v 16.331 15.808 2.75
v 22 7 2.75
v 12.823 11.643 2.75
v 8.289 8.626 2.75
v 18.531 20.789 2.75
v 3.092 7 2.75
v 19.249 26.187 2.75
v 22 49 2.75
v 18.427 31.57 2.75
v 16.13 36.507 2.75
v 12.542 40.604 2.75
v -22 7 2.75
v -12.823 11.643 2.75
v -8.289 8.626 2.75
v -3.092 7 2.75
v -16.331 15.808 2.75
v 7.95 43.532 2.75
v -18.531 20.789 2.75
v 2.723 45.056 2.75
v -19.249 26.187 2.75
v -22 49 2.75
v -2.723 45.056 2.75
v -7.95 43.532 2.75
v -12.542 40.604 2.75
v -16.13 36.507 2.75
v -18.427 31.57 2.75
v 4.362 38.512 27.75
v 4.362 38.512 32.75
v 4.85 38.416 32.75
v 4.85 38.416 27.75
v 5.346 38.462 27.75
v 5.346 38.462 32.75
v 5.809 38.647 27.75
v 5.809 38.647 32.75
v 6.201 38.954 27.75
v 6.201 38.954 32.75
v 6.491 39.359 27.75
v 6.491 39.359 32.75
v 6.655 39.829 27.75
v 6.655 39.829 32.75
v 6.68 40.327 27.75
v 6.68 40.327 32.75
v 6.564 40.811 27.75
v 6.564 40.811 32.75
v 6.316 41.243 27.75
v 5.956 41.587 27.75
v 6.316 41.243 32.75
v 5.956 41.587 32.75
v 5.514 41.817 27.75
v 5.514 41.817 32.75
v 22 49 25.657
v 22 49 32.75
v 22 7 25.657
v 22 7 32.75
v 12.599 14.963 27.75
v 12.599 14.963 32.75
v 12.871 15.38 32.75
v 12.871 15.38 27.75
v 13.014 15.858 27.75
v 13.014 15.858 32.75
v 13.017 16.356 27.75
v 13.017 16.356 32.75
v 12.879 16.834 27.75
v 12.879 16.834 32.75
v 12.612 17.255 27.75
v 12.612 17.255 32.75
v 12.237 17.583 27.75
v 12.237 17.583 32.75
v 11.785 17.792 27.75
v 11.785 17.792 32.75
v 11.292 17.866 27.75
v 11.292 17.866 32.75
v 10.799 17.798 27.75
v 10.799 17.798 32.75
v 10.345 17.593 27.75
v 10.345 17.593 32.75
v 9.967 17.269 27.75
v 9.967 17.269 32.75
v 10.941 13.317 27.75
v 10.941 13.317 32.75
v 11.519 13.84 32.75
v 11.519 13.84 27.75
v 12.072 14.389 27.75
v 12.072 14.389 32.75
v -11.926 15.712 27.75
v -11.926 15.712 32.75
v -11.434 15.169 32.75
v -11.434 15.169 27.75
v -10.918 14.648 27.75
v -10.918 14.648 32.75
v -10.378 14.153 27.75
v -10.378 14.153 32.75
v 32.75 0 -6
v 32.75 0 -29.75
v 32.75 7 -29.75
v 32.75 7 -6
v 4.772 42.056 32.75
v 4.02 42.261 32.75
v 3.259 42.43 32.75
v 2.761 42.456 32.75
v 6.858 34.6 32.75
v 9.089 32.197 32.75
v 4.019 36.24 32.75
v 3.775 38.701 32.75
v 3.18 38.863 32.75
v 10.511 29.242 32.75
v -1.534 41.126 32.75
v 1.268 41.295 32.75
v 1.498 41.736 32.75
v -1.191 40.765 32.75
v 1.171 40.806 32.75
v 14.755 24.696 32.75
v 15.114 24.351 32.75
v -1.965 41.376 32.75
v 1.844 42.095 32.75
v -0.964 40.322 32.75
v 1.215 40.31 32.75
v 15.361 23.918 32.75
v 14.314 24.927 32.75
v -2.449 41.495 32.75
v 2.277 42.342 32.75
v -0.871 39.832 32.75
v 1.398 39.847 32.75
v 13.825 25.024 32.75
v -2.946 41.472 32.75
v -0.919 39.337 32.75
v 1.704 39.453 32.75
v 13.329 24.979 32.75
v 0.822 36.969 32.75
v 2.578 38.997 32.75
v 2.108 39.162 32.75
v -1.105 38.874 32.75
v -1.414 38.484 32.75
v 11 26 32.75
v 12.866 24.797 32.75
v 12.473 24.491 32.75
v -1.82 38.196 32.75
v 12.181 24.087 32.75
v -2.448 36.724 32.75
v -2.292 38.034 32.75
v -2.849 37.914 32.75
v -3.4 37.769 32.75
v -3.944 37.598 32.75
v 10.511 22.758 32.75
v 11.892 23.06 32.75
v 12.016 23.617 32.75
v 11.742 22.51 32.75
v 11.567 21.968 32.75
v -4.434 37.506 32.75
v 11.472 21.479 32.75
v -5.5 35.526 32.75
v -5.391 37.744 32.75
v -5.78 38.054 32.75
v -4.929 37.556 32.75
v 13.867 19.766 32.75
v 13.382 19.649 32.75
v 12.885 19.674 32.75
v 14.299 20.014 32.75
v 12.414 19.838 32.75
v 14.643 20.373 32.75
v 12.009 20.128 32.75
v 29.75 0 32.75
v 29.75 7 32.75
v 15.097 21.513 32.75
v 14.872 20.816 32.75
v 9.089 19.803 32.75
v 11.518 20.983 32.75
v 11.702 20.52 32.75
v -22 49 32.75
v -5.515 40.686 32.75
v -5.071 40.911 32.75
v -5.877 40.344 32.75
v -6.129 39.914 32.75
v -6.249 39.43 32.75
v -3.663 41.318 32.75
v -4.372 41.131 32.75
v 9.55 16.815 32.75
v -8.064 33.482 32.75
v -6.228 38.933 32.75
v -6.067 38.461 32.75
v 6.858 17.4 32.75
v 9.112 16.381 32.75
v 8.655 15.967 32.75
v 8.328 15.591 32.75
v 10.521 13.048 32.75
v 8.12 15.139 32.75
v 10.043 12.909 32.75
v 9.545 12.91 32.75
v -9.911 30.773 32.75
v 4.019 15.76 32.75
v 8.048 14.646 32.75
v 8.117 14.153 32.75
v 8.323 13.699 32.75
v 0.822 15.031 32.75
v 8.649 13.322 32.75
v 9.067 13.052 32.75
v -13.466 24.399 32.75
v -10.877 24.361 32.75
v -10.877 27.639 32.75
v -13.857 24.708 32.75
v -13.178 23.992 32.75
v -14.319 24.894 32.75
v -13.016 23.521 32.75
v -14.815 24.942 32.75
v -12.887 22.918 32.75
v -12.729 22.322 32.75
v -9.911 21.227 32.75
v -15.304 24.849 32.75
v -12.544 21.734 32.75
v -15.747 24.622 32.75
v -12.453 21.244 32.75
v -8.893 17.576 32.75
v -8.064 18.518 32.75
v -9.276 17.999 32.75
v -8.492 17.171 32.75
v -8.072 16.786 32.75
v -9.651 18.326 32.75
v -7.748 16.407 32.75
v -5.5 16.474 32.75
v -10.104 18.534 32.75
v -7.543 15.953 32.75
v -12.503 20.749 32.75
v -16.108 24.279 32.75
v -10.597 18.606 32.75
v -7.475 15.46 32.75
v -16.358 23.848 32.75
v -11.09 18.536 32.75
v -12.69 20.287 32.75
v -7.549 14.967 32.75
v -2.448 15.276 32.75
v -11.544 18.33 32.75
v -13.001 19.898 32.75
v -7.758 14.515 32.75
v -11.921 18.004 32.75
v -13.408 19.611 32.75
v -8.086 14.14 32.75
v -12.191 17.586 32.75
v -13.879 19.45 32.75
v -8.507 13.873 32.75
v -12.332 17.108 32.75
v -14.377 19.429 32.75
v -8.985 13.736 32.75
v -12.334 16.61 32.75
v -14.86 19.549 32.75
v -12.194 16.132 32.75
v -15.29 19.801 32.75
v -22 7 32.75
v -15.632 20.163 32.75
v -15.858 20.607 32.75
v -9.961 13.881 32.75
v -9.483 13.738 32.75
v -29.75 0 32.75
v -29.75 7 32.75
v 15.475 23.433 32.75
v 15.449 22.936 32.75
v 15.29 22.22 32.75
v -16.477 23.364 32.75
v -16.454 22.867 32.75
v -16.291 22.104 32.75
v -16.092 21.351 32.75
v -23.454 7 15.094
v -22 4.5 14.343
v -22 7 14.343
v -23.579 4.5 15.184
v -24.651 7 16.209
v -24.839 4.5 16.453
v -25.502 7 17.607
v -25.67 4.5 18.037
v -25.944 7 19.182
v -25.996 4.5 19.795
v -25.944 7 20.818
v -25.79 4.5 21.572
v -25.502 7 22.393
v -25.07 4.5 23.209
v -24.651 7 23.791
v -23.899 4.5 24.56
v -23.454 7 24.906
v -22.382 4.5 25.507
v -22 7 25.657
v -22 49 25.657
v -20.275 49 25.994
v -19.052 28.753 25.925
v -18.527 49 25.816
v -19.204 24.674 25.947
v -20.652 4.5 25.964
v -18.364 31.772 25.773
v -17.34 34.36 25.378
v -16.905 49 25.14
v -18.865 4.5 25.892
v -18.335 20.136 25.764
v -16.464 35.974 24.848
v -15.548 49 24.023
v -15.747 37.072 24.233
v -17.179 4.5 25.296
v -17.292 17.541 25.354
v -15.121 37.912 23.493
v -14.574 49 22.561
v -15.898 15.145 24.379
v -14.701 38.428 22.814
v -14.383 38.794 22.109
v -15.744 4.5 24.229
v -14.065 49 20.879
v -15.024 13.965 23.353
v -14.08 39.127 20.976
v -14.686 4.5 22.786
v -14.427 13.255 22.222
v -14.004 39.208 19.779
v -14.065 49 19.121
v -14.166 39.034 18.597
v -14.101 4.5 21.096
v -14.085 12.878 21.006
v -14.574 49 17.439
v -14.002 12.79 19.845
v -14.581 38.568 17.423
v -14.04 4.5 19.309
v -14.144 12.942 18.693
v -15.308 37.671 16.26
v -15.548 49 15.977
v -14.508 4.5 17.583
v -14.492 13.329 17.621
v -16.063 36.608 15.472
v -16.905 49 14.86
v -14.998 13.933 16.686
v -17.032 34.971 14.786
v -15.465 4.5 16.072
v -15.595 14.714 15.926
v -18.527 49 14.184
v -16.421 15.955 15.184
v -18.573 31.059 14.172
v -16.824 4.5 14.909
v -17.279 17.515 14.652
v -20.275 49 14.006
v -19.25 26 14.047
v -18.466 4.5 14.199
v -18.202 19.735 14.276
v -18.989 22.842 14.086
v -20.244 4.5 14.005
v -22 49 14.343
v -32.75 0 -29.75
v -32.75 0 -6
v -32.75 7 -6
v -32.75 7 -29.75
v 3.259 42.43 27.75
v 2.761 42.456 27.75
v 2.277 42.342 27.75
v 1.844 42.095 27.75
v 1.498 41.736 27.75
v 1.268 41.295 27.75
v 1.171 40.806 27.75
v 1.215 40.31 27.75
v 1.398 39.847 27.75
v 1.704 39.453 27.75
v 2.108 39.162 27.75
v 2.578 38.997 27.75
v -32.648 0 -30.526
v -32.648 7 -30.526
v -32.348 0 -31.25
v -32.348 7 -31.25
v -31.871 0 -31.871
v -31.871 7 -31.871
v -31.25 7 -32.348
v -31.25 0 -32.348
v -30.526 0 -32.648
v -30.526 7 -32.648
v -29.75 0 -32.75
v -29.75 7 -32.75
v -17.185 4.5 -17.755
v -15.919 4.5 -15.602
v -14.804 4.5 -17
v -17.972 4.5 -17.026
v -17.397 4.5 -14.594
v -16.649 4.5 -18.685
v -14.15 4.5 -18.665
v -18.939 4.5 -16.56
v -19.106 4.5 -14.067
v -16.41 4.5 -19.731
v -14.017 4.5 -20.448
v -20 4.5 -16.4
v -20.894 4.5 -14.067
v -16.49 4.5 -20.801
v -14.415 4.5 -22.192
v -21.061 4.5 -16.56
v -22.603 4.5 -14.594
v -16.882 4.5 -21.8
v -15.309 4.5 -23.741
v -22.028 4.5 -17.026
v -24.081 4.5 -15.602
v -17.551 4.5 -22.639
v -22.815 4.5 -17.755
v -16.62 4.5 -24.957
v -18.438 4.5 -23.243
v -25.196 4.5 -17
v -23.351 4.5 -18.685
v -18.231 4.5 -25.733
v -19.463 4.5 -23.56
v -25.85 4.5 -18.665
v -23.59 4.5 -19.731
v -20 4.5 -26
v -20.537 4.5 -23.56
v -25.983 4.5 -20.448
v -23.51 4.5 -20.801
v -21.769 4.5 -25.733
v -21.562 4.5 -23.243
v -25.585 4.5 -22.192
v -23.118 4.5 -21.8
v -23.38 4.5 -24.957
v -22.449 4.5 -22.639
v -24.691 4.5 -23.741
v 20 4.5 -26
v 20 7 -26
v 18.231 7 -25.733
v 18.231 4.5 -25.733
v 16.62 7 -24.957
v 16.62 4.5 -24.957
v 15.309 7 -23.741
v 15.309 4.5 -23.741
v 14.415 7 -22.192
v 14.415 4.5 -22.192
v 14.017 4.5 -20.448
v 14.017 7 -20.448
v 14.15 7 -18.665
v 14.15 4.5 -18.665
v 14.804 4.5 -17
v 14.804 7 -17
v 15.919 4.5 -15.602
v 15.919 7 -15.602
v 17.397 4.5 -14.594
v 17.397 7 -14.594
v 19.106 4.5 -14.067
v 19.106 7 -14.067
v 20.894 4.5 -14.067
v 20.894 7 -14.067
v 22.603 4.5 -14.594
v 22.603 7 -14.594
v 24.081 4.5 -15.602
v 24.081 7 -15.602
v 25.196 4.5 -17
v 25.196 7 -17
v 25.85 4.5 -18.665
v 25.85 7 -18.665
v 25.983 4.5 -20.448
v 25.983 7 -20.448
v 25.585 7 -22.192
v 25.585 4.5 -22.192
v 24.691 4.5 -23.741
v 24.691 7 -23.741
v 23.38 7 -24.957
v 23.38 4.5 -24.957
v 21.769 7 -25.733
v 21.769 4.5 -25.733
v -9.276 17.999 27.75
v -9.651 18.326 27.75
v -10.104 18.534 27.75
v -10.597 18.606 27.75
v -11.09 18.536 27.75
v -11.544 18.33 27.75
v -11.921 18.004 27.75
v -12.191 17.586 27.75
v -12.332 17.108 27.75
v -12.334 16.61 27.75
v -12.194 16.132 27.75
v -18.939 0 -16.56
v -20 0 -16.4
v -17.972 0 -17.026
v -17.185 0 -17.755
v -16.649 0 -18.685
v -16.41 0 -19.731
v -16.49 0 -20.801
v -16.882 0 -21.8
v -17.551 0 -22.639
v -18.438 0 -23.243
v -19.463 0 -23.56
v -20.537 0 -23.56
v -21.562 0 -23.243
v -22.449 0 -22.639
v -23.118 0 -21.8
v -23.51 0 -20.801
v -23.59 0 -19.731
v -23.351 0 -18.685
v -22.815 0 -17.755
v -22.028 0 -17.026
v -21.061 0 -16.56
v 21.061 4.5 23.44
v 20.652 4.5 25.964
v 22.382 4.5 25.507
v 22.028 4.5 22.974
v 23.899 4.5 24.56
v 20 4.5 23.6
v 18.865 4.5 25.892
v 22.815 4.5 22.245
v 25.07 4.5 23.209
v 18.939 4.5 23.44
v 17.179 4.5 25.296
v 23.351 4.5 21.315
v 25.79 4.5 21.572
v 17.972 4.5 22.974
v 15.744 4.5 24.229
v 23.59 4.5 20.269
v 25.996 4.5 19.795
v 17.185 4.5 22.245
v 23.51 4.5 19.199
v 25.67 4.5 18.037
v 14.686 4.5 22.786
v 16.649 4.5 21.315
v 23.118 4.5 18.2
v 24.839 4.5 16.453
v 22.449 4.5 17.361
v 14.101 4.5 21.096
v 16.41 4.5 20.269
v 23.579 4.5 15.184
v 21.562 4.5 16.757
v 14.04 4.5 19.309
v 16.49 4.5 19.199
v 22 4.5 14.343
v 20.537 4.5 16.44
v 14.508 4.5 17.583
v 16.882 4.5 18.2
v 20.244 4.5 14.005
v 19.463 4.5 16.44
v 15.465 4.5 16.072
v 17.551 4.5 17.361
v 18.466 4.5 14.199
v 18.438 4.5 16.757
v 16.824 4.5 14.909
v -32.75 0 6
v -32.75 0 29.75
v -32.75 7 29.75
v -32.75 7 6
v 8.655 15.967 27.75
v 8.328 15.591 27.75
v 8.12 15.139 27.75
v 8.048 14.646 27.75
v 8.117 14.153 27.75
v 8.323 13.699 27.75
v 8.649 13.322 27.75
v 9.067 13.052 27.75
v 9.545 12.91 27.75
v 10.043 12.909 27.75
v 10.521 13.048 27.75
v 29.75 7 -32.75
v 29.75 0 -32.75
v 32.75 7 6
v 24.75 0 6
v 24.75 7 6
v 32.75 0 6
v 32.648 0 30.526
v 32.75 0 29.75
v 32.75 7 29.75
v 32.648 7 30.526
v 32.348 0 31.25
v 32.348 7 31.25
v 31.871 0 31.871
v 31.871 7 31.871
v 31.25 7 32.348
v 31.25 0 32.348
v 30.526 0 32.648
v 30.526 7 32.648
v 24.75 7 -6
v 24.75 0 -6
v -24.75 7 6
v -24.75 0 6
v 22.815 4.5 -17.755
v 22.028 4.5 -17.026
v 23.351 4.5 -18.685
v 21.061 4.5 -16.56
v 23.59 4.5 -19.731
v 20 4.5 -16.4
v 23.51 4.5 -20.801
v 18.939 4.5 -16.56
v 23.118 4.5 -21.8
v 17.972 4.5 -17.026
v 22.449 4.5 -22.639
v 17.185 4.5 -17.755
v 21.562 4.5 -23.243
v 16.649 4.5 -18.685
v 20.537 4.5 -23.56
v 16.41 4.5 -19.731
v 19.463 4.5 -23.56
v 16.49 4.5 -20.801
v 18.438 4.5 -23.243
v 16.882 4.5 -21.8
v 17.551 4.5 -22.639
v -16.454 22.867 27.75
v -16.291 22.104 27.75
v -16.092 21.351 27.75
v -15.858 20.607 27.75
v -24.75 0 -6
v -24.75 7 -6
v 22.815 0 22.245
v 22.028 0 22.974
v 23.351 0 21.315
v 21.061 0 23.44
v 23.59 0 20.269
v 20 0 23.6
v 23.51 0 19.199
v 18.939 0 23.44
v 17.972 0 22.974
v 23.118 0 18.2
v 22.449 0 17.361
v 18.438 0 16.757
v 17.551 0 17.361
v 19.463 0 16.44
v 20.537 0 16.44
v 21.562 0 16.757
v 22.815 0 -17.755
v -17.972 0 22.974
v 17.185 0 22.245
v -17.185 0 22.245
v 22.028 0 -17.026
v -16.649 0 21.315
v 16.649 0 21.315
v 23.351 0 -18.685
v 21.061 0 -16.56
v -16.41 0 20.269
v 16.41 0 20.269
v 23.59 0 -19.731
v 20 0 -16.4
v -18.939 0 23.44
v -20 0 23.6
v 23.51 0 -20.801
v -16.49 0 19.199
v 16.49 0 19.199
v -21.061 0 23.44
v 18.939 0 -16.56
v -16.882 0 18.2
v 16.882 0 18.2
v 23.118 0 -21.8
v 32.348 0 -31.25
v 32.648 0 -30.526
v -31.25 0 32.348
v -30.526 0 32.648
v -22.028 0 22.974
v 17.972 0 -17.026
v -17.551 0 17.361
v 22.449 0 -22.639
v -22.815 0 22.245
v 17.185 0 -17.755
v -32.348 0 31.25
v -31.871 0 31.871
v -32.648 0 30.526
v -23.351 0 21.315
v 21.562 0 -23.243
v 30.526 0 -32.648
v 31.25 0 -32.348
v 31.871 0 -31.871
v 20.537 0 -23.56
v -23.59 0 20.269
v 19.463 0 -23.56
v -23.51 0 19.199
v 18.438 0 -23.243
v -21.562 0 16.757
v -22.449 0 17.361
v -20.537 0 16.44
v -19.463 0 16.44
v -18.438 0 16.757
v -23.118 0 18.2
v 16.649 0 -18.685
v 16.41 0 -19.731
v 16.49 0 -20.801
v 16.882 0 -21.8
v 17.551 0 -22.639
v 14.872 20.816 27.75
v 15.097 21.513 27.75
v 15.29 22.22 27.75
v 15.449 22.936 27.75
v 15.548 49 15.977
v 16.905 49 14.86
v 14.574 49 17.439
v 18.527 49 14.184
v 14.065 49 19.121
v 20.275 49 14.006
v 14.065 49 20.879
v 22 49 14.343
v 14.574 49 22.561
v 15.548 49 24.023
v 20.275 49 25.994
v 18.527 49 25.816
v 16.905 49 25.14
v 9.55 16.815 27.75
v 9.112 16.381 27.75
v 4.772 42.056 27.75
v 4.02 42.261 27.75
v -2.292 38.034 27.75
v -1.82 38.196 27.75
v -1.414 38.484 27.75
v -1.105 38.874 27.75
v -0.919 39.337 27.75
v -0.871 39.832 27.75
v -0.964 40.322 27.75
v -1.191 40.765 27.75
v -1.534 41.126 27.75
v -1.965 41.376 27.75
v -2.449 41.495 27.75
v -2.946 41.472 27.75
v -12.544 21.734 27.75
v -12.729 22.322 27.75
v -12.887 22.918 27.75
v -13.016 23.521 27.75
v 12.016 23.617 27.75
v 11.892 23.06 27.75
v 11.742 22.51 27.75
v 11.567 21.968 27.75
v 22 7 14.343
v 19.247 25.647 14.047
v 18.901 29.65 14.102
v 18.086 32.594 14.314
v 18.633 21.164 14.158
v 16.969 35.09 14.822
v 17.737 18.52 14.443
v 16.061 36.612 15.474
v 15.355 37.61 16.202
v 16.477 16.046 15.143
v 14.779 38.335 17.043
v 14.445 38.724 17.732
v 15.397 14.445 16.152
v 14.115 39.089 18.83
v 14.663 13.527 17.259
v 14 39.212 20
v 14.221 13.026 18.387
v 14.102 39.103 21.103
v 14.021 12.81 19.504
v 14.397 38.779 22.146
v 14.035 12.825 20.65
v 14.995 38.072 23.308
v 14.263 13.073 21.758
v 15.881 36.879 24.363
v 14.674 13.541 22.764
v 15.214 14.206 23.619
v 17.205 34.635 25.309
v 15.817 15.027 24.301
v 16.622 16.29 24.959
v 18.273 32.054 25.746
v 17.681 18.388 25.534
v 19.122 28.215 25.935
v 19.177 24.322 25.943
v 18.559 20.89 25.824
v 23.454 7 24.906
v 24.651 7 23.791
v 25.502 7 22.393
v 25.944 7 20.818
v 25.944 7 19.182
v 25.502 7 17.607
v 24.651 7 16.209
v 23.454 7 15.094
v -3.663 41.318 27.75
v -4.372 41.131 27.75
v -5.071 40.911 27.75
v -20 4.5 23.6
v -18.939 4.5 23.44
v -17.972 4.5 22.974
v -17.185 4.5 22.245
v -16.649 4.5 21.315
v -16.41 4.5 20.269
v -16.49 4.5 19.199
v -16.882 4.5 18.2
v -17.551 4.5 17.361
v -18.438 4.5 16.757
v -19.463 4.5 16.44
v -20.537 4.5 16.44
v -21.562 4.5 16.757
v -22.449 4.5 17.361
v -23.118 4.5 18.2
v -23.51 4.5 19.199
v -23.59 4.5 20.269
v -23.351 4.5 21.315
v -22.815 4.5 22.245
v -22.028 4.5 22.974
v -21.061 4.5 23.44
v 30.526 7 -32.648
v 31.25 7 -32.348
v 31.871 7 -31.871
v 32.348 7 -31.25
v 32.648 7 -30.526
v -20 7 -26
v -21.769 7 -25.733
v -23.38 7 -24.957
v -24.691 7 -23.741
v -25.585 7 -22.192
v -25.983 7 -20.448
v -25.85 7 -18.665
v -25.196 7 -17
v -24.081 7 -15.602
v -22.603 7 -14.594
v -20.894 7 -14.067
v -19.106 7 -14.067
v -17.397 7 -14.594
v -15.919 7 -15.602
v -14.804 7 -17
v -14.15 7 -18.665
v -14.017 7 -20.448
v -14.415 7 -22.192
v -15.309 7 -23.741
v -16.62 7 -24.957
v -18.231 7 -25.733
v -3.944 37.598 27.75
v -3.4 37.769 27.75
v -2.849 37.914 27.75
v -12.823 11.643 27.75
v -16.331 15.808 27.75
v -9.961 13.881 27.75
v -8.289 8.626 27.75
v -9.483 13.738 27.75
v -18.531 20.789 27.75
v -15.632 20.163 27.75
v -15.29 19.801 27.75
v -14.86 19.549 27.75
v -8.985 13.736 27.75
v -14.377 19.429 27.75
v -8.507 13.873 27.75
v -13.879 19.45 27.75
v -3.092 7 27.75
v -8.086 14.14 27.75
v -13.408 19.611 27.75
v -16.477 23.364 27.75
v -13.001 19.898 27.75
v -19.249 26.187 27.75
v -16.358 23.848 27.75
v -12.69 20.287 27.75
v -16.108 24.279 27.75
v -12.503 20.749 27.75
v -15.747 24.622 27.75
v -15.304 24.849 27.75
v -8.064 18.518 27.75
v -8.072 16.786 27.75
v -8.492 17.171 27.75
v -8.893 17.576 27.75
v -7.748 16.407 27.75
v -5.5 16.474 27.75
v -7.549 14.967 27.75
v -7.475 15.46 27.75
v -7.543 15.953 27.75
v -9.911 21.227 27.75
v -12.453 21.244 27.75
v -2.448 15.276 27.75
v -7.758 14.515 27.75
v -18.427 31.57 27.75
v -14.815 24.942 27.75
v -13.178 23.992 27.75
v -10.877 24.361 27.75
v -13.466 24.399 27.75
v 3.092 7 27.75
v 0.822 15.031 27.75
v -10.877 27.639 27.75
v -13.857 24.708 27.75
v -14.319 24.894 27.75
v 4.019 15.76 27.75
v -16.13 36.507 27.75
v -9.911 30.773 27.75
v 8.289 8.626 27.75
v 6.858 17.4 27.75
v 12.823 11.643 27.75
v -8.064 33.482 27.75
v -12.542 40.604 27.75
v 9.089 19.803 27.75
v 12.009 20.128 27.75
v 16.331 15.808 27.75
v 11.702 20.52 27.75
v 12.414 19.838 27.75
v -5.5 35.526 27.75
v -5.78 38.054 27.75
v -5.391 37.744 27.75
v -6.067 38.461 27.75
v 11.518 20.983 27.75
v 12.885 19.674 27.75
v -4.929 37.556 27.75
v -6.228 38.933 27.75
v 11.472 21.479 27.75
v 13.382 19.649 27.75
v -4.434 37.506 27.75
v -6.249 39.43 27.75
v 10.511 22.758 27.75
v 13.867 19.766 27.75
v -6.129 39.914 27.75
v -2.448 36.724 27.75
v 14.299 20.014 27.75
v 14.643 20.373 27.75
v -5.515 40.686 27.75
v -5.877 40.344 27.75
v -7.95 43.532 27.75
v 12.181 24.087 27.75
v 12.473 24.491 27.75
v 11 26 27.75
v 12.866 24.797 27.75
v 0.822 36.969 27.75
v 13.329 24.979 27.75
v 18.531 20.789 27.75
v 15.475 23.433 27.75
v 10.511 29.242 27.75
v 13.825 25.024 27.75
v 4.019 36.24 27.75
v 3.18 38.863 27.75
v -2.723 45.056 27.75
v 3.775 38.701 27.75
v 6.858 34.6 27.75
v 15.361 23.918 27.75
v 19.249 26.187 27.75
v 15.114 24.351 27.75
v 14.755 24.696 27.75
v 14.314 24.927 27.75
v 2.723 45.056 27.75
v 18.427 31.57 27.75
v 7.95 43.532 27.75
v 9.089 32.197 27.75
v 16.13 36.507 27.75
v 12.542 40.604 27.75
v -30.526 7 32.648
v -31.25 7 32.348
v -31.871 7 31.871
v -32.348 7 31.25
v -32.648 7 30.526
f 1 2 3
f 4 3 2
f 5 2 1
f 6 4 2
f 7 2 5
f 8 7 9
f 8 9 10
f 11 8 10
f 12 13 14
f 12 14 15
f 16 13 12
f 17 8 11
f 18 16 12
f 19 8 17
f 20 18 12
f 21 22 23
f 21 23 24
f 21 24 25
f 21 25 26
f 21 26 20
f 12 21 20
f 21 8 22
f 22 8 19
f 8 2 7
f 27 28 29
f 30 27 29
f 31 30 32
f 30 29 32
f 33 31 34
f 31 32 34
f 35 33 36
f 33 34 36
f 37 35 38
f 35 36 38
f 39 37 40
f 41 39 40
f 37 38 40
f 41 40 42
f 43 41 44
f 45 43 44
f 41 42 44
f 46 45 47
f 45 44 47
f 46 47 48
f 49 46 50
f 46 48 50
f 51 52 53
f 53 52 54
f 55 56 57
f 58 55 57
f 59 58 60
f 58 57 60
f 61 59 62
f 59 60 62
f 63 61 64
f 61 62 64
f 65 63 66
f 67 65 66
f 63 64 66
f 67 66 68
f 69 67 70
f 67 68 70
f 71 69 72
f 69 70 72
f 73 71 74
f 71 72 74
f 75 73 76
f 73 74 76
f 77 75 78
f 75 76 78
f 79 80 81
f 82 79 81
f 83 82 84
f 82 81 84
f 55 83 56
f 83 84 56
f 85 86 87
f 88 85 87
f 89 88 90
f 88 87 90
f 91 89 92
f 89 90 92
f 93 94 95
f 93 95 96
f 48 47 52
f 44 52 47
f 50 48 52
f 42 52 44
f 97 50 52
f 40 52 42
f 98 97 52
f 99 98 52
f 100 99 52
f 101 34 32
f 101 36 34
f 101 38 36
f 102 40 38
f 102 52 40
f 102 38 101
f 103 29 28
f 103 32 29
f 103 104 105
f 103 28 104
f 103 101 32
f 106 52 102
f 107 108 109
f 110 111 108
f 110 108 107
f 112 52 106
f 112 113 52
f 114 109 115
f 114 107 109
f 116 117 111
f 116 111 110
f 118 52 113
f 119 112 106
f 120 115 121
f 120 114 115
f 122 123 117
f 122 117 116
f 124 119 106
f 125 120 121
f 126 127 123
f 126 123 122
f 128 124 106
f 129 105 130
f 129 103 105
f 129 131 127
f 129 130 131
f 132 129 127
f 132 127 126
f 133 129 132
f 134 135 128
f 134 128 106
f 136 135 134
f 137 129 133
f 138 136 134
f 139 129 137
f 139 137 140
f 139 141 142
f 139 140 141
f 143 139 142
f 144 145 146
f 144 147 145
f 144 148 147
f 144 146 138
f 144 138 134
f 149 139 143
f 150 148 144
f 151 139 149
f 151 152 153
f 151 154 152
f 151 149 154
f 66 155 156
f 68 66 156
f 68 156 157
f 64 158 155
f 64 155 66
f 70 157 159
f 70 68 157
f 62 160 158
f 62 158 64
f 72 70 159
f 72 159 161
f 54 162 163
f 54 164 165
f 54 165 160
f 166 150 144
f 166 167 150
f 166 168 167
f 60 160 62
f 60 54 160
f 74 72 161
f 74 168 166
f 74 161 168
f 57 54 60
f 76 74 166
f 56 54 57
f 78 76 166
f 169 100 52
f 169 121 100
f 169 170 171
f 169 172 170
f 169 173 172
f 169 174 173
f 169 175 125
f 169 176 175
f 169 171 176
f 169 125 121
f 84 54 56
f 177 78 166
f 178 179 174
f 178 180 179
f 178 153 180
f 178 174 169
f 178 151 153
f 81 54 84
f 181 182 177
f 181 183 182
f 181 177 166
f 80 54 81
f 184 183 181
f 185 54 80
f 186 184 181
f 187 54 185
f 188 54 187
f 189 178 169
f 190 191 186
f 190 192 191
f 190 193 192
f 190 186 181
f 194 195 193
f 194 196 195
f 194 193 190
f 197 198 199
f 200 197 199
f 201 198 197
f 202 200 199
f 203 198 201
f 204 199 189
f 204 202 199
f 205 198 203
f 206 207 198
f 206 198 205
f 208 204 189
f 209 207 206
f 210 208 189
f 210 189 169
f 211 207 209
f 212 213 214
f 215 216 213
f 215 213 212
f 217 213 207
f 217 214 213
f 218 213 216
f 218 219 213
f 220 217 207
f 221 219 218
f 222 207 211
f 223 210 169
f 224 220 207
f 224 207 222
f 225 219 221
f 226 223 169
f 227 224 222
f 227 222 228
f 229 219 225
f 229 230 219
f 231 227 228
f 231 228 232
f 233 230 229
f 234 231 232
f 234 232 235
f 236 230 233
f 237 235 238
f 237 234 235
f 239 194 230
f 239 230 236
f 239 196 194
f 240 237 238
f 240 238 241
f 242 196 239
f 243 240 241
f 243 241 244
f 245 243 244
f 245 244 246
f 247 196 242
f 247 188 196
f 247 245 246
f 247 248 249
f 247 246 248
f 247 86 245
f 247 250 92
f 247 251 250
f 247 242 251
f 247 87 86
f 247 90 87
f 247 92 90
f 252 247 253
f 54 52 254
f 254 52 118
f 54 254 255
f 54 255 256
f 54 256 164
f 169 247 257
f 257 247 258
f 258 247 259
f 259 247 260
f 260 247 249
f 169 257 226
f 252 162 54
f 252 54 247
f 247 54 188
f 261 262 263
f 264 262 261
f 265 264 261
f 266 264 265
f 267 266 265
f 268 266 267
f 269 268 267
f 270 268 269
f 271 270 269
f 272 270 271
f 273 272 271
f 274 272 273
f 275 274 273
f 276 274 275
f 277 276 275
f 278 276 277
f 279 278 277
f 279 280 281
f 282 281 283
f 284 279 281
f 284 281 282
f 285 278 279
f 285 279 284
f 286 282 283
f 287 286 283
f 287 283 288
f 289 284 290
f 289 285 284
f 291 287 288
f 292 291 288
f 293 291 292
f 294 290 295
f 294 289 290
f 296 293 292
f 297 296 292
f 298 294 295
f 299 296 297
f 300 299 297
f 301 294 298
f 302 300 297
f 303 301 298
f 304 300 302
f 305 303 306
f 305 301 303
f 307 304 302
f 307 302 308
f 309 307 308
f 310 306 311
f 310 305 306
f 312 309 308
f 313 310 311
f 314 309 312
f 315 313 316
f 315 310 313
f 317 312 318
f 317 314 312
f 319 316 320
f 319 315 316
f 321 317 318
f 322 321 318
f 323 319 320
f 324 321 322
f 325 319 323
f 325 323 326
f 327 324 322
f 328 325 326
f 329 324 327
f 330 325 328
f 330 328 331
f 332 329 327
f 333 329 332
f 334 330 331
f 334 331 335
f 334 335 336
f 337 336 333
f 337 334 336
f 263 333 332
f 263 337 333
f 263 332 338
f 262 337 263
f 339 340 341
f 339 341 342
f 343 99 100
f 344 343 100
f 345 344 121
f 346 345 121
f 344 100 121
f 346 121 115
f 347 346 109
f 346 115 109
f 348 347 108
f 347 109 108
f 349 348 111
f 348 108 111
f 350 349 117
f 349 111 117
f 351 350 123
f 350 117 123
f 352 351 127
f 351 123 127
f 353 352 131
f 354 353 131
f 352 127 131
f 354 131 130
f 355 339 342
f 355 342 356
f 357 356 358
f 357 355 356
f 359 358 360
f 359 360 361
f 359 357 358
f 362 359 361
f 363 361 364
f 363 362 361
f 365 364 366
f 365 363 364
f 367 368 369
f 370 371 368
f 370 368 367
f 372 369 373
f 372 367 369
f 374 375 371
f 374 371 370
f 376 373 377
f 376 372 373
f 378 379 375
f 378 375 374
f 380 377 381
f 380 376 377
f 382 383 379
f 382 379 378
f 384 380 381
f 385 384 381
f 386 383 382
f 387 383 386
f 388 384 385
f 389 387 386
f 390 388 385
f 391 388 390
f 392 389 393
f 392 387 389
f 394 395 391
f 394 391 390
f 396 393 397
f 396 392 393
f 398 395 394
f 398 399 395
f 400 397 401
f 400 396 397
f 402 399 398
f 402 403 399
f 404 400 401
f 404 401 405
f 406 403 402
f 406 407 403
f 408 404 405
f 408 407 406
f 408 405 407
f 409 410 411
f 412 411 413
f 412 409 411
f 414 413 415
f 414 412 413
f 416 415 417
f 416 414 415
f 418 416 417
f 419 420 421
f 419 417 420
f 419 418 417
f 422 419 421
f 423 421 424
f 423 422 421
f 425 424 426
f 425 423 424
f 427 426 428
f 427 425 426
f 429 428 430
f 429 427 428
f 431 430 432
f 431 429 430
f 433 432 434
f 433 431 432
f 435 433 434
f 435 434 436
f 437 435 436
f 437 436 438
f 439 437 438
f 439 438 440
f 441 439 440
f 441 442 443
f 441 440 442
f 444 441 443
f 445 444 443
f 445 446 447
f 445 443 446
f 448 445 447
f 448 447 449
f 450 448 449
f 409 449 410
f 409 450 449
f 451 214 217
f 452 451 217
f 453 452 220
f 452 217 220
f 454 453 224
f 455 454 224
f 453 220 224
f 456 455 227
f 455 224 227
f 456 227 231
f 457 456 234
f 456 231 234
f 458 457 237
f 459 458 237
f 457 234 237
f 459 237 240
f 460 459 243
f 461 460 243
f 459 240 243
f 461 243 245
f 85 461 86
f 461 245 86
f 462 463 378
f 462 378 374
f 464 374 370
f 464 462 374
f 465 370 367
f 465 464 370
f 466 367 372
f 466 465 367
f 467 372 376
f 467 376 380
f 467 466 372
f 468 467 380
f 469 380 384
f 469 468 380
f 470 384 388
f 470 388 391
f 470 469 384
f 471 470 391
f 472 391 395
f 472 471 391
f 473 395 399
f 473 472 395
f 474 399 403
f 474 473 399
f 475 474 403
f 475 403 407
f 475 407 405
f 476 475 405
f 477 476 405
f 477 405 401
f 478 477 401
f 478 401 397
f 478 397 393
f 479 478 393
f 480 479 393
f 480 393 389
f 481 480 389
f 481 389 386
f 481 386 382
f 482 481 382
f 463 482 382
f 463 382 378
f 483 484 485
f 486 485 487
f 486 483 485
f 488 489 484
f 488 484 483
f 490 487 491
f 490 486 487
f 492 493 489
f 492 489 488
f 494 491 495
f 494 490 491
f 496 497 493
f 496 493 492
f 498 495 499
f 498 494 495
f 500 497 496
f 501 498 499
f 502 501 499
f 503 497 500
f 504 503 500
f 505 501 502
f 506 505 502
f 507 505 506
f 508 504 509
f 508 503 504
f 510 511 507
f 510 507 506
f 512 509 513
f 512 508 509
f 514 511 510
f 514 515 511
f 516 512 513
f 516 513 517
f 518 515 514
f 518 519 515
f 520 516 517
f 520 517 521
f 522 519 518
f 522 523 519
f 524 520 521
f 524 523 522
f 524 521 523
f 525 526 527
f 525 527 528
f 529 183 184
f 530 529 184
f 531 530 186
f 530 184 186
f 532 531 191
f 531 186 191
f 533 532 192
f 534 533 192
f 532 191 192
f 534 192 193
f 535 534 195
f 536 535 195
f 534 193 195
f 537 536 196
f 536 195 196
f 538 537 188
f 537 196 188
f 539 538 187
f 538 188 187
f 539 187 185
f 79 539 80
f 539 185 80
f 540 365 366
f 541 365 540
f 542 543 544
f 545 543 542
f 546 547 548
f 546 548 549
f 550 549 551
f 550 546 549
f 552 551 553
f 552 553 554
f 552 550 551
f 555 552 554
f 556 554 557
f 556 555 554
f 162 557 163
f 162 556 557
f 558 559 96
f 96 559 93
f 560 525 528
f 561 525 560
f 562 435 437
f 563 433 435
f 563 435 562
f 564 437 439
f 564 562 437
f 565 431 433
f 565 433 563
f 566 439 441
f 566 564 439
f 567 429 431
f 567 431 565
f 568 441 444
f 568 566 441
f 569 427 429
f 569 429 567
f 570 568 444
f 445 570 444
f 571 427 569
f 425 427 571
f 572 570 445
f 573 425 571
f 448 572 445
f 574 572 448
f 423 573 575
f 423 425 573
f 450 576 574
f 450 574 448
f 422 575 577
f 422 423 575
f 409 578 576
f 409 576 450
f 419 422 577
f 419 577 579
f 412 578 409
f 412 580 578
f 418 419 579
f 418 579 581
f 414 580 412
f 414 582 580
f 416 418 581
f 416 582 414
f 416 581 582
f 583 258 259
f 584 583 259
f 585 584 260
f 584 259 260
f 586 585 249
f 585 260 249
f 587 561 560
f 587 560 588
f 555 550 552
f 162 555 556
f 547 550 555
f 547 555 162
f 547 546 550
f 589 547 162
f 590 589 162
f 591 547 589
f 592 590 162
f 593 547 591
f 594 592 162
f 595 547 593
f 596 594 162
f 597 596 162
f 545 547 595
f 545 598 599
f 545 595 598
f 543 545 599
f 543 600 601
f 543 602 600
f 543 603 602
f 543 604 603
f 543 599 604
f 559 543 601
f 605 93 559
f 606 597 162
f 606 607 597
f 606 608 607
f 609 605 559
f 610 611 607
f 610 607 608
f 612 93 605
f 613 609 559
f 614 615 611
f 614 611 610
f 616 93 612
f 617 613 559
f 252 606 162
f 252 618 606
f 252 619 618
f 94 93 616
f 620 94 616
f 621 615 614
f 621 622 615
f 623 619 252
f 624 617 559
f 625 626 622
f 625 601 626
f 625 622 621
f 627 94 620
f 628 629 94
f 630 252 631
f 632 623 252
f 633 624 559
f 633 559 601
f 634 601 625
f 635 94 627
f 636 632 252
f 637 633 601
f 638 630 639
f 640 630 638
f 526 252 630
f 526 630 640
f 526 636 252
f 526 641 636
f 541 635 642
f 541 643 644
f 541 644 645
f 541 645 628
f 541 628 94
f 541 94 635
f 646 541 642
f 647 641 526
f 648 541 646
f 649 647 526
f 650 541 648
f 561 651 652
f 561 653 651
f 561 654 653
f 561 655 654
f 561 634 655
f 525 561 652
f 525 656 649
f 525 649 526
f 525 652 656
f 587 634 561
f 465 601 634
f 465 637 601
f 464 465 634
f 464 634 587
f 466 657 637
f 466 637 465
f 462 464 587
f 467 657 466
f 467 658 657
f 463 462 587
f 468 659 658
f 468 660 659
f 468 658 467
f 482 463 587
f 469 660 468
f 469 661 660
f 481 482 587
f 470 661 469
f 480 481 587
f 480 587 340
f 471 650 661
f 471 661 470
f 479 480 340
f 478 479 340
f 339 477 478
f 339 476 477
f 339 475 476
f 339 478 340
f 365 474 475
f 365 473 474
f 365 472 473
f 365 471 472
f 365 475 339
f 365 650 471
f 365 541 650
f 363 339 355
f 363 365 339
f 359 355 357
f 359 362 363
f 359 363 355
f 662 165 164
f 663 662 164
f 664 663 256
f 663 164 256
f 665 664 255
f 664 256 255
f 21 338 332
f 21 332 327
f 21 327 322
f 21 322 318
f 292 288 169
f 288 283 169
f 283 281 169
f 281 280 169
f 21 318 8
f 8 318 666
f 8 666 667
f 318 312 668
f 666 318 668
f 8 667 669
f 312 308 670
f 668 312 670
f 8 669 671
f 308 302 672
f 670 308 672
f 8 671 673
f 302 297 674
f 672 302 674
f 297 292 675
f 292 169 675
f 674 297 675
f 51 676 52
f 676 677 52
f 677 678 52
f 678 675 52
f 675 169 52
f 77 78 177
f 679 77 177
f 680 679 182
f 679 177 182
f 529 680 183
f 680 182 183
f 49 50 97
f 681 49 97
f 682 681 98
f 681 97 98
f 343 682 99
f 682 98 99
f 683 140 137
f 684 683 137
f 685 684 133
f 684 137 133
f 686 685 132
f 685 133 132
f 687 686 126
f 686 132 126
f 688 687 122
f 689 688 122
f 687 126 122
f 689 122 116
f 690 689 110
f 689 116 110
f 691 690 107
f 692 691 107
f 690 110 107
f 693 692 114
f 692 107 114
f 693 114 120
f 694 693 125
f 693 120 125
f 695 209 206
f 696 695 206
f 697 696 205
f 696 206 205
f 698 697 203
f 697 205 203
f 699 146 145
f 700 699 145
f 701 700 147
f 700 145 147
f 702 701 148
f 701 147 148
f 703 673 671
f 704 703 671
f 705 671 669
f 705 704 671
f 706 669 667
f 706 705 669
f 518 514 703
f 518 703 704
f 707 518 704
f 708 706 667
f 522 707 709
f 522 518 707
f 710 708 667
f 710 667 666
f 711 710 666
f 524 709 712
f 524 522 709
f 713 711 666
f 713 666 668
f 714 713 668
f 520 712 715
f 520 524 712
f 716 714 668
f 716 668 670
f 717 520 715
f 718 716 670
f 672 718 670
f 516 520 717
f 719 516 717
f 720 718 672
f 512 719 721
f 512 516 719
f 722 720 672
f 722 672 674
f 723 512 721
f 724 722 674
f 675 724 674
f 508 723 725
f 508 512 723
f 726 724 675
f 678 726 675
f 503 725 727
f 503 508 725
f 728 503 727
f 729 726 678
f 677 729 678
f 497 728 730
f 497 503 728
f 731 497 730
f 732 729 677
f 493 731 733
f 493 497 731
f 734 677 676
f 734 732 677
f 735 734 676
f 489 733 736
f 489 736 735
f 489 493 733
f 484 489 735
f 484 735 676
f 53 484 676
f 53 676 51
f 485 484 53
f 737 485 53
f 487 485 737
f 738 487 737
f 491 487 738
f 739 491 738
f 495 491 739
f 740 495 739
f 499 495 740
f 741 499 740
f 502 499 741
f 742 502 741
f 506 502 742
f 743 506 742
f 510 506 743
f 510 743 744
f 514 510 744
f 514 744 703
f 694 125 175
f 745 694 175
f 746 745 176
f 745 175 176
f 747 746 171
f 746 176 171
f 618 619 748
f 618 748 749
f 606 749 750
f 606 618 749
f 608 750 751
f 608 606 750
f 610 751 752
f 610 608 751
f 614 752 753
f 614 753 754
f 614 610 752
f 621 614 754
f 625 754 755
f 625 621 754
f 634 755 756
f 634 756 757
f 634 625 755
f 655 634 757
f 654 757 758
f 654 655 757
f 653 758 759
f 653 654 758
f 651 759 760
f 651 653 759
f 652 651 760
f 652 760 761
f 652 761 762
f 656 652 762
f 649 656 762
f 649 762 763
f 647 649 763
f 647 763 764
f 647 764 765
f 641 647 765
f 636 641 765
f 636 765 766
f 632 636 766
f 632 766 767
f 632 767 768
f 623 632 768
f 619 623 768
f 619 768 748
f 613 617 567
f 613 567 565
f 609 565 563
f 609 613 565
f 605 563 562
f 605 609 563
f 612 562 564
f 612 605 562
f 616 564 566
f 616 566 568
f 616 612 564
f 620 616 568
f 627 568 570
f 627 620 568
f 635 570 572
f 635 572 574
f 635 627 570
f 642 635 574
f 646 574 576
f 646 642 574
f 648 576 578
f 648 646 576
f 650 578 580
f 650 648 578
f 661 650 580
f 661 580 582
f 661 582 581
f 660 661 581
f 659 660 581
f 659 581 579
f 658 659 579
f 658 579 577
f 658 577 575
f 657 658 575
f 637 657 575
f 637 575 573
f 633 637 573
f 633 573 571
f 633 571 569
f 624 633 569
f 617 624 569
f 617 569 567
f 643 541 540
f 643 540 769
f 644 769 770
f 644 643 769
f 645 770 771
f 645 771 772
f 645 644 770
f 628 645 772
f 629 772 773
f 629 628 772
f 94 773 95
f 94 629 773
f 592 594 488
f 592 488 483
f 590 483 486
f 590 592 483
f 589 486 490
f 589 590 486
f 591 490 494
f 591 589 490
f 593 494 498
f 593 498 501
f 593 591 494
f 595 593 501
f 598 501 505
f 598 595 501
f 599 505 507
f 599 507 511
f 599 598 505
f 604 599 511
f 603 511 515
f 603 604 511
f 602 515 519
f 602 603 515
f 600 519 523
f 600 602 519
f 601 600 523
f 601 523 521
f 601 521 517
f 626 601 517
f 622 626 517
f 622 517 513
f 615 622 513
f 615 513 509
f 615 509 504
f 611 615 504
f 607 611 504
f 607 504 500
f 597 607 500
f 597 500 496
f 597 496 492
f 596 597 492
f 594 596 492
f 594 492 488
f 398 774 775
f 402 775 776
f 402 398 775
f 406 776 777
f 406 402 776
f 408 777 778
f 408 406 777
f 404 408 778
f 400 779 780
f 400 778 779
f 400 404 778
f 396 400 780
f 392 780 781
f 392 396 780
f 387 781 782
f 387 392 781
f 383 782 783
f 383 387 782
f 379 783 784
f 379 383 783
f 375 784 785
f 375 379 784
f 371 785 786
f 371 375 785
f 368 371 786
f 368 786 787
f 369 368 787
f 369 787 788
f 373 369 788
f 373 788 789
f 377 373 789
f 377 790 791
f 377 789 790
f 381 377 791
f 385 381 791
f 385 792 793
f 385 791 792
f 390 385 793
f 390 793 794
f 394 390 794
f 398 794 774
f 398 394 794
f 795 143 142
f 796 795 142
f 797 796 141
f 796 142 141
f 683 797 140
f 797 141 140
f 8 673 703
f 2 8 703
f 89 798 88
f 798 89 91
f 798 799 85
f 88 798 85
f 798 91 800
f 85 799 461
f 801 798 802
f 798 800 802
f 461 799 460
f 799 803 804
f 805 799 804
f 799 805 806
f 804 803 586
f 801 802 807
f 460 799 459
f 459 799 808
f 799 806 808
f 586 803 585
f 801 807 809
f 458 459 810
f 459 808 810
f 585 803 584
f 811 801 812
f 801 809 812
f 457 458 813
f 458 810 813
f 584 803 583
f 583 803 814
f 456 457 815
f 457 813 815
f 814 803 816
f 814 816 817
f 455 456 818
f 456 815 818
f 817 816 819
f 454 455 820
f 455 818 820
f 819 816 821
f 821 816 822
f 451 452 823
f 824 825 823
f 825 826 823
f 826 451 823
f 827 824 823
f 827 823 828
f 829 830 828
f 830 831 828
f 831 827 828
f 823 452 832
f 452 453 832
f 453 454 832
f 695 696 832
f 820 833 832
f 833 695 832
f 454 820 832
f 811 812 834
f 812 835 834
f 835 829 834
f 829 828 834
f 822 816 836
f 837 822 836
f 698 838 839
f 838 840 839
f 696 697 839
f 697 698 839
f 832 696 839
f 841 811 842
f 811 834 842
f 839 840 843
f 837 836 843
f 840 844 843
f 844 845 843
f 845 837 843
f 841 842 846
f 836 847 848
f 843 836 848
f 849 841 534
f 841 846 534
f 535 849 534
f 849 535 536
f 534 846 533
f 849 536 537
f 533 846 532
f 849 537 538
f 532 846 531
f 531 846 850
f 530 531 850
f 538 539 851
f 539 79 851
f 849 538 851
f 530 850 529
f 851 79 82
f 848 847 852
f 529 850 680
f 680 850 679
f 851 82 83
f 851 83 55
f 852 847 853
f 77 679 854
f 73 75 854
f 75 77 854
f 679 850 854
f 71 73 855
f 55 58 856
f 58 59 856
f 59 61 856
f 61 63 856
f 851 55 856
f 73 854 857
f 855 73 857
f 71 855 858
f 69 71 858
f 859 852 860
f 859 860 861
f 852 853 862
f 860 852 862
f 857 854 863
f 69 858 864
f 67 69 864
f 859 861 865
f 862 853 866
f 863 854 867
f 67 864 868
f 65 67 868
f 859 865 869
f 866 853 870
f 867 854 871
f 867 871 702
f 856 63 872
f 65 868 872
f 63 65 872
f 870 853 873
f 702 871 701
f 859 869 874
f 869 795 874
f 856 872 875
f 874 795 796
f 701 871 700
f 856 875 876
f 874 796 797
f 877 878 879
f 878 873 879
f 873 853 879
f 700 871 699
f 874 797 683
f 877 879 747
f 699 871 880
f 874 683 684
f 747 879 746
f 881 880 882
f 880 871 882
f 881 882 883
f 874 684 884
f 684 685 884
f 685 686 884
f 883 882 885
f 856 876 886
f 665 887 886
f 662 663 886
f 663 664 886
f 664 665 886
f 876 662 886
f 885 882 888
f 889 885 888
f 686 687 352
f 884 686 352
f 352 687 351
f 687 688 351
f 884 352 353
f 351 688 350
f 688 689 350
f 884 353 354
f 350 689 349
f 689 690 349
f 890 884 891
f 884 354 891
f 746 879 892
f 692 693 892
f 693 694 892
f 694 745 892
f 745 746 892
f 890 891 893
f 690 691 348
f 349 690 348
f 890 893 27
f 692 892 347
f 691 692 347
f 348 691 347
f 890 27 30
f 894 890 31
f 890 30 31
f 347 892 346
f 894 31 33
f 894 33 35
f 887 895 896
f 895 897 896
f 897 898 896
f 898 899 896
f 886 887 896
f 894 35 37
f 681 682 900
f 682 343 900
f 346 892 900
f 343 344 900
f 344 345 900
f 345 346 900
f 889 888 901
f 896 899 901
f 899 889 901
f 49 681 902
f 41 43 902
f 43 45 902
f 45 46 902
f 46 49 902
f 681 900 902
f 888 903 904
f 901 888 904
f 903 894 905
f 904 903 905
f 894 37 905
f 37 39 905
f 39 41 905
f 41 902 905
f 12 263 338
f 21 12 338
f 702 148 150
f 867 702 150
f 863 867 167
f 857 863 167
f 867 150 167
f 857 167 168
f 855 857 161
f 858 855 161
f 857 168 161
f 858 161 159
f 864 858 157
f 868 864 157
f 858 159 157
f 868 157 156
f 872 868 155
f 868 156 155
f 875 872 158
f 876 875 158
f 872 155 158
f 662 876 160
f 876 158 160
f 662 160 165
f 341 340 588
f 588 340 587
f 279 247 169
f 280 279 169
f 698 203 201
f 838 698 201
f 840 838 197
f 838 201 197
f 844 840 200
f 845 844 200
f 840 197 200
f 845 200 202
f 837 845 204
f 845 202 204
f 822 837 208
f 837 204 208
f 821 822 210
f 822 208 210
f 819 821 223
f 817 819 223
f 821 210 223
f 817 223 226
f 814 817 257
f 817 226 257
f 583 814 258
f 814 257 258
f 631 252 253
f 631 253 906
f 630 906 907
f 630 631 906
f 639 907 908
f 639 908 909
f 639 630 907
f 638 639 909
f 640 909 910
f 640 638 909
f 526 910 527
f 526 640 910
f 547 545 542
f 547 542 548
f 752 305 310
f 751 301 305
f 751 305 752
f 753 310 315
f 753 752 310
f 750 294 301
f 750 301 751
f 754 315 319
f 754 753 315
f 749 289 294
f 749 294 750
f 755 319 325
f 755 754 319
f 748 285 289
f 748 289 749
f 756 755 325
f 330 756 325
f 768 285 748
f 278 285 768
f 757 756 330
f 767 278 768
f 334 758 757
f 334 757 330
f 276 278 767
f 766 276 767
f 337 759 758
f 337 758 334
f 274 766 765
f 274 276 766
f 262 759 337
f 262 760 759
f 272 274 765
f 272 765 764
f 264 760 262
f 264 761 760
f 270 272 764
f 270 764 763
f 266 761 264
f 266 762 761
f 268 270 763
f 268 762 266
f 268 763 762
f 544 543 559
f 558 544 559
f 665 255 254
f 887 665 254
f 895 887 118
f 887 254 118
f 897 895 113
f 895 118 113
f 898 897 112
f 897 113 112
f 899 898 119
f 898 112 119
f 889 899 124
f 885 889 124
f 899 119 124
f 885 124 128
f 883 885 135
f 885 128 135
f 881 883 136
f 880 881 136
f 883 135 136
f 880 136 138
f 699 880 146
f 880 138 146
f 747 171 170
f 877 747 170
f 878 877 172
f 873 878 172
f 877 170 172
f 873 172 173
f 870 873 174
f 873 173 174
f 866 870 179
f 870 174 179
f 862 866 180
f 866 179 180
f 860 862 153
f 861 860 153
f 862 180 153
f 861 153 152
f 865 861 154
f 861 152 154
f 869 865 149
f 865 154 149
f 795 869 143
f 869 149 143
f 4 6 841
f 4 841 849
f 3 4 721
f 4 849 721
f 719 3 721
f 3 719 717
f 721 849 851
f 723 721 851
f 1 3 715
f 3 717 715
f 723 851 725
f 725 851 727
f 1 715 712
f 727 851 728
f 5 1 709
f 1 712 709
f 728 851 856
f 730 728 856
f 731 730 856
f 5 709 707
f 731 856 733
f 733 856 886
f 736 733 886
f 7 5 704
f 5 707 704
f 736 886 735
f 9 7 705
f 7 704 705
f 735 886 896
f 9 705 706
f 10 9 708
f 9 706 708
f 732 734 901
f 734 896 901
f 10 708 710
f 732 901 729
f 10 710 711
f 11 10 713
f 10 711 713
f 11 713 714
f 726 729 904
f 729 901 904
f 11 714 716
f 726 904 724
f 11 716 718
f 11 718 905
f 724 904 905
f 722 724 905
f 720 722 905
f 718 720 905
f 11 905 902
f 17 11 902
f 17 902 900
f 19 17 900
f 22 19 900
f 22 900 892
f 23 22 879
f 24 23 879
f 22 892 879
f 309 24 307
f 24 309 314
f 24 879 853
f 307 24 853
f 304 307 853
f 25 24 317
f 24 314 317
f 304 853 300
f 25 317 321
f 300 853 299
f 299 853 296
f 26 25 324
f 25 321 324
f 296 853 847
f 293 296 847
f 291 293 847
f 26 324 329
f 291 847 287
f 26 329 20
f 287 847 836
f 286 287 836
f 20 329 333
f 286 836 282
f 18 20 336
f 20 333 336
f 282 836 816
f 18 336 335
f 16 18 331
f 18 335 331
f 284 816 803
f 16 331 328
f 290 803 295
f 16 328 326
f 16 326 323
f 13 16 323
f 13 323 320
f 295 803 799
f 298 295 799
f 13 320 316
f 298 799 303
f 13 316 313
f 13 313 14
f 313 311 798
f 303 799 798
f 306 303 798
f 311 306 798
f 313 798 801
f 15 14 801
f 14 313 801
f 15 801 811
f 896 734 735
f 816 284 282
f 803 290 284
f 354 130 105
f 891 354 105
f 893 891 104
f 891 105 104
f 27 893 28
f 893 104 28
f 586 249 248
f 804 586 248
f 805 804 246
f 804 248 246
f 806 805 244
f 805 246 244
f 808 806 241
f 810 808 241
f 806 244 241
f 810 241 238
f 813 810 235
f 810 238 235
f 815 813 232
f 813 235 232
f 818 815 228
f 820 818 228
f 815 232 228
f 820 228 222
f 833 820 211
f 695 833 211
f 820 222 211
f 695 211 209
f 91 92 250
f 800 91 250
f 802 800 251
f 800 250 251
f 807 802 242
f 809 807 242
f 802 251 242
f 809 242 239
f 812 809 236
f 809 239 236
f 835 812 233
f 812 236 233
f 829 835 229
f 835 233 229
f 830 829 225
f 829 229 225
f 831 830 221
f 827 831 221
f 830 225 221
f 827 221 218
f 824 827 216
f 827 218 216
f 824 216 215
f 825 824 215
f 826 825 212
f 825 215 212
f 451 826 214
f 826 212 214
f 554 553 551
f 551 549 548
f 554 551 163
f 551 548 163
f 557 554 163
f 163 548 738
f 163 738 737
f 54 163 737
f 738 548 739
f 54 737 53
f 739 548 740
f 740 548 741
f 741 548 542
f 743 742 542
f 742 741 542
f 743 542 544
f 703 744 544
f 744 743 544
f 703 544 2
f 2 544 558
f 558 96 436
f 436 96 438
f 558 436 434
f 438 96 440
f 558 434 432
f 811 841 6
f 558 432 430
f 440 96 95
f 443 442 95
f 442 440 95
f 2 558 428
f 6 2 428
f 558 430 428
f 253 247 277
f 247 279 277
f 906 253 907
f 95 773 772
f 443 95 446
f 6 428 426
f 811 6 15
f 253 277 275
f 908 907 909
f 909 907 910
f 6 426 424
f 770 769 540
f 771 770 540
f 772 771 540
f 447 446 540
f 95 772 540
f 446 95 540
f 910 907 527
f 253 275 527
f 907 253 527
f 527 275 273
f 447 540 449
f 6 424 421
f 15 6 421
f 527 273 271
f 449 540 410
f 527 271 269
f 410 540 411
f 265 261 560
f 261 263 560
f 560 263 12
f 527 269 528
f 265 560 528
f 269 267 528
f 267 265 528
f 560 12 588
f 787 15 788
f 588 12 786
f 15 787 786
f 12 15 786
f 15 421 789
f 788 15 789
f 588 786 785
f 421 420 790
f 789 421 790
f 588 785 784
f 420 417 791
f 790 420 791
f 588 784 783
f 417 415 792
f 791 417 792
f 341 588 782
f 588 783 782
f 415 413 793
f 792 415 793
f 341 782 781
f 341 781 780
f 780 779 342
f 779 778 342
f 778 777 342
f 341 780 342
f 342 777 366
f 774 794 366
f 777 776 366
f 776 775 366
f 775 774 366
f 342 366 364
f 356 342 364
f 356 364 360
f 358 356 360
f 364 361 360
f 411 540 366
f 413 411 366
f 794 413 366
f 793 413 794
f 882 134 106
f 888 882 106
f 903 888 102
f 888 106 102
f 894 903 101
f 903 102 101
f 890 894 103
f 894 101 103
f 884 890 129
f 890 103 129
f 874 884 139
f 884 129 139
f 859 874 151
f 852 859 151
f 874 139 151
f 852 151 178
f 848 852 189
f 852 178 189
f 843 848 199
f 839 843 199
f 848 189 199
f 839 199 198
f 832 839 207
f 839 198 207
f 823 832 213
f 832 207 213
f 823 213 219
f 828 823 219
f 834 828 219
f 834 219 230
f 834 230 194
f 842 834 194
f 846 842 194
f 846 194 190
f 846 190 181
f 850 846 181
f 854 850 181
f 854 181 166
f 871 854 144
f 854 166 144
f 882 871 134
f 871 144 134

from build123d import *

# Parameters (mm, degrees)
BOSS_EXTRUDE1_DEPTH     = 7
SKETCH2_W               = 44
SKETCH2_H               = 42
SKETCH2_R               = 11
BOSS_EXTRUDE3_DEPTH     = 5
BOSS_EXTRUDE4_DEPTH     = 25
CUT_EXTRUDE6_DEPTH      = 5
CUT_EXTRUDE7_DEPTH      = 63.52299577
CUT_EXTRUDE7_DEPTH_BACK = 63.52299577
SKETCH7_W               = 8
SKETCH7_H               = 12
SKETCH7_R               = 3.6
CUT_EXTRUDE9_DEPTH      = 63.522995837
CUT_EXTRUDE9_DEPTH_BACK = 2.5
SKETCH7_4_R             = 6
SKETCH7_4_R_2           = 3.6
SKETCH7_4_W             = 8
SKETCH7_4_H             = 12


with BuildPart() as part:
    # Sketch1 → Boss-Extrude1 (new body)
    with BuildSketch(Plane(origin=(0, 0, 0), x_dir=(1, 0, 0), z_dir=(0, 1, 0))):
        with BuildLine():
            Line((-29.75, 32.75), (29.75, 32.75))
            ThreePointArc((29.75, 32.75), (31.871320344, 31.871320344), (32.75, 29.75))
            Line((32.75, 29.75), (32.75, -29.75))
            ThreePointArc((32.75, -29.75), (31.871320344, -31.871320344), (29.75, -32.75))
            Line((29.75, -32.75), (-29.75, -32.75))
            ThreePointArc((-29.75, -32.75), (-31.871320344, -31.871320344), (-32.75, -29.75))
            Line((-32.75, -29.75), (-32.75, 29.75))
            ThreePointArc((-32.75, 29.75), (-31.871320344, 31.871320344), (-29.75, 32.75))
        make_face()
    extrude(amount=BOSS_EXTRUDE1_DEPTH)

    # Sketch2 → Boss-Extrude3 (add)
    with BuildSketch(Plane.XY.offset(32.75)):
        with Locations((0, 28)):
            Rectangle(SKETCH2_W, SKETCH2_H)
        with Locations((0, 26)):
            Circle(SKETCH2_R, mode=Mode.SUBTRACT)
    extrude(amount=-BOSS_EXTRUDE3_DEPTH)

    # Sketch3 → Boss-Extrude4 (add)
    with BuildSketch(Plane(origin=(0, 0, 27.75), x_dir=(-1, 0, 0), z_dir=(0, 0, -1))):
        with BuildLine():
            ThreePointArc((-3.092329219, 7), (0, 45.25), (3.092329219, 7))
            Line((3.092329219, 7), (22, 7))
            Line((22, 7), (22, 49))
            Line((22, 49), (-22, 49))
            Line((-22, 49), (-22, 7))
            Line((-22, 7), (-3.092329219, 7))
        make_face()
    extrude(amount=BOSS_EXTRUDE4_DEPTH)

    # Sketch6 → Cut-Extrude6 (cut)
    with BuildSketch(Plane.XY.offset(32.75)):
        with BuildLine():
            ThreePointArc((12.015935701, 23.616769161), (11.820419706, 22.784385288), (11.567315814, 21.967667567))
            ThreePointArc((11.567315814, 21.967667567), (12.643742012, 19.739146389), (14.87226319, 20.815572586))
            ThreePointArc((14.87226319, 20.815572586), (15.197682479, 21.865638228), (15.449060187, 22.935846064))
            ThreePointArc((15.449060187, 22.935846064), (14.072959492, 24.992869856), (12.015935701, 23.616769161))
        make_face()
        with BuildLine():
            ThreePointArc((9.966693425, 17.269162573), (9.333382629, 16.595189066), (8.654600531, 15.967034853))
            ThreePointArc((8.654600531, 15.967034853), (8.472552374, 13.498865801), (10.940721426, 13.316817644))
            ThreePointArc((10.940721426, 13.316817644), (11.798804456, 14.110899386), (12.599404896, 14.96290363))
            ThreePointArc((12.599404896, 14.96290363), (12.436178632, 17.432388837), (9.966693425, 17.269162573))
        make_face()
        with BuildLine():
            ThreePointArc((-9.275760231, 17.998576867), (-11.743929282, 18.180625024), (-11.925977439, 15.712455972))
            ThreePointArc((-11.925977439, 15.712455972), (-11.179303563, 14.905601781), (-10.378165243, 14.152798382))
            ThreePointArc((-10.378165243, 14.152798382), (-7.908680036, 14.316024645), (-8.0719063, 16.785509852))
            ThreePointArc((-8.0719063, 16.785509852), (-8.695013882, 17.371023607), (-9.275760231, 17.998576867))
        make_face()
        with BuildLine():
            ThreePointArc((-13.016102958, 23.521378654), (-15.06257598, 24.913121509), (-16.454318834, 22.866648487))
            ThreePointArc((-16.454318834, 22.866648487), (-16.195665388, 21.726485914), (-15.858108288, 20.607143472))
            ThreePointArc((-15.858108288, 20.607143472), (-13.637858233, 19.51375896), (-12.54447372, 21.734009016))
            ThreePointArc((-12.54447372, 21.734009016), (-12.811496501, 22.619459007), (-13.016102958, 23.521378654))
        make_face()
        with BuildLine():
            ThreePointArc((-2.291555584, 38.033755565), (-0.899812729, 40.080228587), (-2.946285751, 41.471971441))
            ThreePointArc((-2.946285751, 41.471971441), (-4.018378916, 41.228759992), (-5.070894944, 40.911355554))
            ThreePointArc((-5.070894944, 40.911355554), (-6.164279456, 38.691105499), (-3.944029401, 37.597720987))
            ThreePointArc((-3.944029401, 37.597720987), (-3.125405824, 37.844591105), (-2.291555584, 38.033755565))
        make_face()
        with BuildLine():
            ThreePointArc((4.361502427, 38.511586493), (6.590023605, 39.588012691), (5.513597408, 41.816533869))
            ThreePointArc((5.513597408, 41.816533869), (4.396860932, 42.1626147), (3.258703392, 42.429952897))
            ThreePointArc((3.258703392, 42.429952897), (1.201679601, 41.053852203), (2.577780295, 38.996828411))
            ThreePointArc((2.577780295, 38.996828411), (3.478113872, 38.785351927), (4.361502427, 38.511586493))
        make_face()
    extrude(amount=-CUT_EXTRUDE6_DEPTH, mode=Mode.SUBTRACT)

    # Sketch7 → Cut-Extrude7 (cut, two sides: drawn at the far end of the back side and taken through both)
    with BuildSketch(Plane(origin=(0, 7, 0), x_dir=(1, 0, 0), z_dir=(0, 1, 0)).offset(-CUT_EXTRUDE7_DEPTH_BACK)):
        with Locations((-28.75, 0)):
            Rectangle(SKETCH7_W, SKETCH7_H)
        with Locations((28.75, 0)):
            Rectangle(SKETCH7_W, SKETCH7_H)
        with Locations(Location((-20, 20, 0), (0, 0, 270))):
            Circle(SKETCH7_R)
        with Locations(Location((20, 20, 0), (0, 0, 270))):
            Circle(SKETCH7_R)
        with Locations(Location((20, -20, 0), (0, 0, 270))):
            Circle(SKETCH7_R)
        with Locations(Location((-20, -20, 0), (0, 0, 270))):
            Circle(SKETCH7_R)
    extrude(amount=CUT_EXTRUDE7_DEPTH + CUT_EXTRUDE7_DEPTH_BACK, mode=Mode.SUBTRACT)

    # Sketch7<4> → Cut-Extrude9 (cut, two sides: drawn at the far end of the back side and taken through both)
    # profile 1 of 6: a face of its own
    with BuildSketch(Plane(origin=(0, 7, 0), x_dir=(1, 0, 0), z_dir=(0, 1, 0)).offset(-CUT_EXTRUDE9_DEPTH_BACK)):
        with Locations(Location((-20, 20, 0), (0, 0, 90))):
            Circle(SKETCH7_4_R)
        with Locations(Location((-20, 20, 0), (0, 0, 270))):
            Circle(SKETCH7_4_R_2, mode=Mode.SUBTRACT)
    # profile 2 of 6: a face of its own
    with BuildSketch(Plane(origin=(0, 7, 0), x_dir=(1, 0, 0), z_dir=(0, 1, 0)).offset(-CUT_EXTRUDE9_DEPTH_BACK)):
        with Locations(Location((20, 20, 0), (0, 0, 90))):
            Circle(SKETCH7_4_R)
        with Locations(Location((20, 20, 0), (0, 0, 270))):
            Circle(SKETCH7_4_R_2, mode=Mode.SUBTRACT)
    # profile 3 of 6: a face of its own
    with BuildSketch(Plane(origin=(0, 7, 0), x_dir=(1, 0, 0), z_dir=(0, 1, 0)).offset(-CUT_EXTRUDE9_DEPTH_BACK)):
        with Locations(Location((20, -20, 0), (0, 0, 70.528779366))):
            Circle(SKETCH7_4_R)
        with Locations(Location((20, -20, 0), (0, 0, 270))):
            Circle(SKETCH7_4_R_2, mode=Mode.SUBTRACT)
    # profile 4 of 6: a face of its own
    with BuildSketch(Plane(origin=(0, 7, 0), x_dir=(1, 0, 0), z_dir=(0, 1, 0)).offset(-CUT_EXTRUDE9_DEPTH_BACK)):
        with Locations(Location((-20, -20, 0), (0, 0, 109.471220634))):
            Circle(SKETCH7_4_R)
        with Locations(Location((-20, -20, 0), (0, 0, 270))):
            Circle(SKETCH7_4_R_2, mode=Mode.SUBTRACT)
    # profile 5 of 6: a face of its own
    with BuildSketch(Plane(origin=(0, 7, 0), x_dir=(1, 0, 0), z_dir=(0, 1, 0)).offset(-CUT_EXTRUDE9_DEPTH_BACK)):
        with Locations((-28.75, 0)):
            Rectangle(SKETCH7_4_W, SKETCH7_4_H)
    # profile 6 of 6: a face of its own
    with BuildSketch(Plane(origin=(0, 7, 0), x_dir=(1, 0, 0), z_dir=(0, 1, 0)).offset(-CUT_EXTRUDE9_DEPTH_BACK)):
        with Locations((28.75, 0)):
            Rectangle(SKETCH7_4_W, SKETCH7_4_H)
    extrude(amount=CUT_EXTRUDE9_DEPTH + CUT_EXTRUDE9_DEPTH_BACK, mode=Mode.SUBTRACT)


solid = part.part
